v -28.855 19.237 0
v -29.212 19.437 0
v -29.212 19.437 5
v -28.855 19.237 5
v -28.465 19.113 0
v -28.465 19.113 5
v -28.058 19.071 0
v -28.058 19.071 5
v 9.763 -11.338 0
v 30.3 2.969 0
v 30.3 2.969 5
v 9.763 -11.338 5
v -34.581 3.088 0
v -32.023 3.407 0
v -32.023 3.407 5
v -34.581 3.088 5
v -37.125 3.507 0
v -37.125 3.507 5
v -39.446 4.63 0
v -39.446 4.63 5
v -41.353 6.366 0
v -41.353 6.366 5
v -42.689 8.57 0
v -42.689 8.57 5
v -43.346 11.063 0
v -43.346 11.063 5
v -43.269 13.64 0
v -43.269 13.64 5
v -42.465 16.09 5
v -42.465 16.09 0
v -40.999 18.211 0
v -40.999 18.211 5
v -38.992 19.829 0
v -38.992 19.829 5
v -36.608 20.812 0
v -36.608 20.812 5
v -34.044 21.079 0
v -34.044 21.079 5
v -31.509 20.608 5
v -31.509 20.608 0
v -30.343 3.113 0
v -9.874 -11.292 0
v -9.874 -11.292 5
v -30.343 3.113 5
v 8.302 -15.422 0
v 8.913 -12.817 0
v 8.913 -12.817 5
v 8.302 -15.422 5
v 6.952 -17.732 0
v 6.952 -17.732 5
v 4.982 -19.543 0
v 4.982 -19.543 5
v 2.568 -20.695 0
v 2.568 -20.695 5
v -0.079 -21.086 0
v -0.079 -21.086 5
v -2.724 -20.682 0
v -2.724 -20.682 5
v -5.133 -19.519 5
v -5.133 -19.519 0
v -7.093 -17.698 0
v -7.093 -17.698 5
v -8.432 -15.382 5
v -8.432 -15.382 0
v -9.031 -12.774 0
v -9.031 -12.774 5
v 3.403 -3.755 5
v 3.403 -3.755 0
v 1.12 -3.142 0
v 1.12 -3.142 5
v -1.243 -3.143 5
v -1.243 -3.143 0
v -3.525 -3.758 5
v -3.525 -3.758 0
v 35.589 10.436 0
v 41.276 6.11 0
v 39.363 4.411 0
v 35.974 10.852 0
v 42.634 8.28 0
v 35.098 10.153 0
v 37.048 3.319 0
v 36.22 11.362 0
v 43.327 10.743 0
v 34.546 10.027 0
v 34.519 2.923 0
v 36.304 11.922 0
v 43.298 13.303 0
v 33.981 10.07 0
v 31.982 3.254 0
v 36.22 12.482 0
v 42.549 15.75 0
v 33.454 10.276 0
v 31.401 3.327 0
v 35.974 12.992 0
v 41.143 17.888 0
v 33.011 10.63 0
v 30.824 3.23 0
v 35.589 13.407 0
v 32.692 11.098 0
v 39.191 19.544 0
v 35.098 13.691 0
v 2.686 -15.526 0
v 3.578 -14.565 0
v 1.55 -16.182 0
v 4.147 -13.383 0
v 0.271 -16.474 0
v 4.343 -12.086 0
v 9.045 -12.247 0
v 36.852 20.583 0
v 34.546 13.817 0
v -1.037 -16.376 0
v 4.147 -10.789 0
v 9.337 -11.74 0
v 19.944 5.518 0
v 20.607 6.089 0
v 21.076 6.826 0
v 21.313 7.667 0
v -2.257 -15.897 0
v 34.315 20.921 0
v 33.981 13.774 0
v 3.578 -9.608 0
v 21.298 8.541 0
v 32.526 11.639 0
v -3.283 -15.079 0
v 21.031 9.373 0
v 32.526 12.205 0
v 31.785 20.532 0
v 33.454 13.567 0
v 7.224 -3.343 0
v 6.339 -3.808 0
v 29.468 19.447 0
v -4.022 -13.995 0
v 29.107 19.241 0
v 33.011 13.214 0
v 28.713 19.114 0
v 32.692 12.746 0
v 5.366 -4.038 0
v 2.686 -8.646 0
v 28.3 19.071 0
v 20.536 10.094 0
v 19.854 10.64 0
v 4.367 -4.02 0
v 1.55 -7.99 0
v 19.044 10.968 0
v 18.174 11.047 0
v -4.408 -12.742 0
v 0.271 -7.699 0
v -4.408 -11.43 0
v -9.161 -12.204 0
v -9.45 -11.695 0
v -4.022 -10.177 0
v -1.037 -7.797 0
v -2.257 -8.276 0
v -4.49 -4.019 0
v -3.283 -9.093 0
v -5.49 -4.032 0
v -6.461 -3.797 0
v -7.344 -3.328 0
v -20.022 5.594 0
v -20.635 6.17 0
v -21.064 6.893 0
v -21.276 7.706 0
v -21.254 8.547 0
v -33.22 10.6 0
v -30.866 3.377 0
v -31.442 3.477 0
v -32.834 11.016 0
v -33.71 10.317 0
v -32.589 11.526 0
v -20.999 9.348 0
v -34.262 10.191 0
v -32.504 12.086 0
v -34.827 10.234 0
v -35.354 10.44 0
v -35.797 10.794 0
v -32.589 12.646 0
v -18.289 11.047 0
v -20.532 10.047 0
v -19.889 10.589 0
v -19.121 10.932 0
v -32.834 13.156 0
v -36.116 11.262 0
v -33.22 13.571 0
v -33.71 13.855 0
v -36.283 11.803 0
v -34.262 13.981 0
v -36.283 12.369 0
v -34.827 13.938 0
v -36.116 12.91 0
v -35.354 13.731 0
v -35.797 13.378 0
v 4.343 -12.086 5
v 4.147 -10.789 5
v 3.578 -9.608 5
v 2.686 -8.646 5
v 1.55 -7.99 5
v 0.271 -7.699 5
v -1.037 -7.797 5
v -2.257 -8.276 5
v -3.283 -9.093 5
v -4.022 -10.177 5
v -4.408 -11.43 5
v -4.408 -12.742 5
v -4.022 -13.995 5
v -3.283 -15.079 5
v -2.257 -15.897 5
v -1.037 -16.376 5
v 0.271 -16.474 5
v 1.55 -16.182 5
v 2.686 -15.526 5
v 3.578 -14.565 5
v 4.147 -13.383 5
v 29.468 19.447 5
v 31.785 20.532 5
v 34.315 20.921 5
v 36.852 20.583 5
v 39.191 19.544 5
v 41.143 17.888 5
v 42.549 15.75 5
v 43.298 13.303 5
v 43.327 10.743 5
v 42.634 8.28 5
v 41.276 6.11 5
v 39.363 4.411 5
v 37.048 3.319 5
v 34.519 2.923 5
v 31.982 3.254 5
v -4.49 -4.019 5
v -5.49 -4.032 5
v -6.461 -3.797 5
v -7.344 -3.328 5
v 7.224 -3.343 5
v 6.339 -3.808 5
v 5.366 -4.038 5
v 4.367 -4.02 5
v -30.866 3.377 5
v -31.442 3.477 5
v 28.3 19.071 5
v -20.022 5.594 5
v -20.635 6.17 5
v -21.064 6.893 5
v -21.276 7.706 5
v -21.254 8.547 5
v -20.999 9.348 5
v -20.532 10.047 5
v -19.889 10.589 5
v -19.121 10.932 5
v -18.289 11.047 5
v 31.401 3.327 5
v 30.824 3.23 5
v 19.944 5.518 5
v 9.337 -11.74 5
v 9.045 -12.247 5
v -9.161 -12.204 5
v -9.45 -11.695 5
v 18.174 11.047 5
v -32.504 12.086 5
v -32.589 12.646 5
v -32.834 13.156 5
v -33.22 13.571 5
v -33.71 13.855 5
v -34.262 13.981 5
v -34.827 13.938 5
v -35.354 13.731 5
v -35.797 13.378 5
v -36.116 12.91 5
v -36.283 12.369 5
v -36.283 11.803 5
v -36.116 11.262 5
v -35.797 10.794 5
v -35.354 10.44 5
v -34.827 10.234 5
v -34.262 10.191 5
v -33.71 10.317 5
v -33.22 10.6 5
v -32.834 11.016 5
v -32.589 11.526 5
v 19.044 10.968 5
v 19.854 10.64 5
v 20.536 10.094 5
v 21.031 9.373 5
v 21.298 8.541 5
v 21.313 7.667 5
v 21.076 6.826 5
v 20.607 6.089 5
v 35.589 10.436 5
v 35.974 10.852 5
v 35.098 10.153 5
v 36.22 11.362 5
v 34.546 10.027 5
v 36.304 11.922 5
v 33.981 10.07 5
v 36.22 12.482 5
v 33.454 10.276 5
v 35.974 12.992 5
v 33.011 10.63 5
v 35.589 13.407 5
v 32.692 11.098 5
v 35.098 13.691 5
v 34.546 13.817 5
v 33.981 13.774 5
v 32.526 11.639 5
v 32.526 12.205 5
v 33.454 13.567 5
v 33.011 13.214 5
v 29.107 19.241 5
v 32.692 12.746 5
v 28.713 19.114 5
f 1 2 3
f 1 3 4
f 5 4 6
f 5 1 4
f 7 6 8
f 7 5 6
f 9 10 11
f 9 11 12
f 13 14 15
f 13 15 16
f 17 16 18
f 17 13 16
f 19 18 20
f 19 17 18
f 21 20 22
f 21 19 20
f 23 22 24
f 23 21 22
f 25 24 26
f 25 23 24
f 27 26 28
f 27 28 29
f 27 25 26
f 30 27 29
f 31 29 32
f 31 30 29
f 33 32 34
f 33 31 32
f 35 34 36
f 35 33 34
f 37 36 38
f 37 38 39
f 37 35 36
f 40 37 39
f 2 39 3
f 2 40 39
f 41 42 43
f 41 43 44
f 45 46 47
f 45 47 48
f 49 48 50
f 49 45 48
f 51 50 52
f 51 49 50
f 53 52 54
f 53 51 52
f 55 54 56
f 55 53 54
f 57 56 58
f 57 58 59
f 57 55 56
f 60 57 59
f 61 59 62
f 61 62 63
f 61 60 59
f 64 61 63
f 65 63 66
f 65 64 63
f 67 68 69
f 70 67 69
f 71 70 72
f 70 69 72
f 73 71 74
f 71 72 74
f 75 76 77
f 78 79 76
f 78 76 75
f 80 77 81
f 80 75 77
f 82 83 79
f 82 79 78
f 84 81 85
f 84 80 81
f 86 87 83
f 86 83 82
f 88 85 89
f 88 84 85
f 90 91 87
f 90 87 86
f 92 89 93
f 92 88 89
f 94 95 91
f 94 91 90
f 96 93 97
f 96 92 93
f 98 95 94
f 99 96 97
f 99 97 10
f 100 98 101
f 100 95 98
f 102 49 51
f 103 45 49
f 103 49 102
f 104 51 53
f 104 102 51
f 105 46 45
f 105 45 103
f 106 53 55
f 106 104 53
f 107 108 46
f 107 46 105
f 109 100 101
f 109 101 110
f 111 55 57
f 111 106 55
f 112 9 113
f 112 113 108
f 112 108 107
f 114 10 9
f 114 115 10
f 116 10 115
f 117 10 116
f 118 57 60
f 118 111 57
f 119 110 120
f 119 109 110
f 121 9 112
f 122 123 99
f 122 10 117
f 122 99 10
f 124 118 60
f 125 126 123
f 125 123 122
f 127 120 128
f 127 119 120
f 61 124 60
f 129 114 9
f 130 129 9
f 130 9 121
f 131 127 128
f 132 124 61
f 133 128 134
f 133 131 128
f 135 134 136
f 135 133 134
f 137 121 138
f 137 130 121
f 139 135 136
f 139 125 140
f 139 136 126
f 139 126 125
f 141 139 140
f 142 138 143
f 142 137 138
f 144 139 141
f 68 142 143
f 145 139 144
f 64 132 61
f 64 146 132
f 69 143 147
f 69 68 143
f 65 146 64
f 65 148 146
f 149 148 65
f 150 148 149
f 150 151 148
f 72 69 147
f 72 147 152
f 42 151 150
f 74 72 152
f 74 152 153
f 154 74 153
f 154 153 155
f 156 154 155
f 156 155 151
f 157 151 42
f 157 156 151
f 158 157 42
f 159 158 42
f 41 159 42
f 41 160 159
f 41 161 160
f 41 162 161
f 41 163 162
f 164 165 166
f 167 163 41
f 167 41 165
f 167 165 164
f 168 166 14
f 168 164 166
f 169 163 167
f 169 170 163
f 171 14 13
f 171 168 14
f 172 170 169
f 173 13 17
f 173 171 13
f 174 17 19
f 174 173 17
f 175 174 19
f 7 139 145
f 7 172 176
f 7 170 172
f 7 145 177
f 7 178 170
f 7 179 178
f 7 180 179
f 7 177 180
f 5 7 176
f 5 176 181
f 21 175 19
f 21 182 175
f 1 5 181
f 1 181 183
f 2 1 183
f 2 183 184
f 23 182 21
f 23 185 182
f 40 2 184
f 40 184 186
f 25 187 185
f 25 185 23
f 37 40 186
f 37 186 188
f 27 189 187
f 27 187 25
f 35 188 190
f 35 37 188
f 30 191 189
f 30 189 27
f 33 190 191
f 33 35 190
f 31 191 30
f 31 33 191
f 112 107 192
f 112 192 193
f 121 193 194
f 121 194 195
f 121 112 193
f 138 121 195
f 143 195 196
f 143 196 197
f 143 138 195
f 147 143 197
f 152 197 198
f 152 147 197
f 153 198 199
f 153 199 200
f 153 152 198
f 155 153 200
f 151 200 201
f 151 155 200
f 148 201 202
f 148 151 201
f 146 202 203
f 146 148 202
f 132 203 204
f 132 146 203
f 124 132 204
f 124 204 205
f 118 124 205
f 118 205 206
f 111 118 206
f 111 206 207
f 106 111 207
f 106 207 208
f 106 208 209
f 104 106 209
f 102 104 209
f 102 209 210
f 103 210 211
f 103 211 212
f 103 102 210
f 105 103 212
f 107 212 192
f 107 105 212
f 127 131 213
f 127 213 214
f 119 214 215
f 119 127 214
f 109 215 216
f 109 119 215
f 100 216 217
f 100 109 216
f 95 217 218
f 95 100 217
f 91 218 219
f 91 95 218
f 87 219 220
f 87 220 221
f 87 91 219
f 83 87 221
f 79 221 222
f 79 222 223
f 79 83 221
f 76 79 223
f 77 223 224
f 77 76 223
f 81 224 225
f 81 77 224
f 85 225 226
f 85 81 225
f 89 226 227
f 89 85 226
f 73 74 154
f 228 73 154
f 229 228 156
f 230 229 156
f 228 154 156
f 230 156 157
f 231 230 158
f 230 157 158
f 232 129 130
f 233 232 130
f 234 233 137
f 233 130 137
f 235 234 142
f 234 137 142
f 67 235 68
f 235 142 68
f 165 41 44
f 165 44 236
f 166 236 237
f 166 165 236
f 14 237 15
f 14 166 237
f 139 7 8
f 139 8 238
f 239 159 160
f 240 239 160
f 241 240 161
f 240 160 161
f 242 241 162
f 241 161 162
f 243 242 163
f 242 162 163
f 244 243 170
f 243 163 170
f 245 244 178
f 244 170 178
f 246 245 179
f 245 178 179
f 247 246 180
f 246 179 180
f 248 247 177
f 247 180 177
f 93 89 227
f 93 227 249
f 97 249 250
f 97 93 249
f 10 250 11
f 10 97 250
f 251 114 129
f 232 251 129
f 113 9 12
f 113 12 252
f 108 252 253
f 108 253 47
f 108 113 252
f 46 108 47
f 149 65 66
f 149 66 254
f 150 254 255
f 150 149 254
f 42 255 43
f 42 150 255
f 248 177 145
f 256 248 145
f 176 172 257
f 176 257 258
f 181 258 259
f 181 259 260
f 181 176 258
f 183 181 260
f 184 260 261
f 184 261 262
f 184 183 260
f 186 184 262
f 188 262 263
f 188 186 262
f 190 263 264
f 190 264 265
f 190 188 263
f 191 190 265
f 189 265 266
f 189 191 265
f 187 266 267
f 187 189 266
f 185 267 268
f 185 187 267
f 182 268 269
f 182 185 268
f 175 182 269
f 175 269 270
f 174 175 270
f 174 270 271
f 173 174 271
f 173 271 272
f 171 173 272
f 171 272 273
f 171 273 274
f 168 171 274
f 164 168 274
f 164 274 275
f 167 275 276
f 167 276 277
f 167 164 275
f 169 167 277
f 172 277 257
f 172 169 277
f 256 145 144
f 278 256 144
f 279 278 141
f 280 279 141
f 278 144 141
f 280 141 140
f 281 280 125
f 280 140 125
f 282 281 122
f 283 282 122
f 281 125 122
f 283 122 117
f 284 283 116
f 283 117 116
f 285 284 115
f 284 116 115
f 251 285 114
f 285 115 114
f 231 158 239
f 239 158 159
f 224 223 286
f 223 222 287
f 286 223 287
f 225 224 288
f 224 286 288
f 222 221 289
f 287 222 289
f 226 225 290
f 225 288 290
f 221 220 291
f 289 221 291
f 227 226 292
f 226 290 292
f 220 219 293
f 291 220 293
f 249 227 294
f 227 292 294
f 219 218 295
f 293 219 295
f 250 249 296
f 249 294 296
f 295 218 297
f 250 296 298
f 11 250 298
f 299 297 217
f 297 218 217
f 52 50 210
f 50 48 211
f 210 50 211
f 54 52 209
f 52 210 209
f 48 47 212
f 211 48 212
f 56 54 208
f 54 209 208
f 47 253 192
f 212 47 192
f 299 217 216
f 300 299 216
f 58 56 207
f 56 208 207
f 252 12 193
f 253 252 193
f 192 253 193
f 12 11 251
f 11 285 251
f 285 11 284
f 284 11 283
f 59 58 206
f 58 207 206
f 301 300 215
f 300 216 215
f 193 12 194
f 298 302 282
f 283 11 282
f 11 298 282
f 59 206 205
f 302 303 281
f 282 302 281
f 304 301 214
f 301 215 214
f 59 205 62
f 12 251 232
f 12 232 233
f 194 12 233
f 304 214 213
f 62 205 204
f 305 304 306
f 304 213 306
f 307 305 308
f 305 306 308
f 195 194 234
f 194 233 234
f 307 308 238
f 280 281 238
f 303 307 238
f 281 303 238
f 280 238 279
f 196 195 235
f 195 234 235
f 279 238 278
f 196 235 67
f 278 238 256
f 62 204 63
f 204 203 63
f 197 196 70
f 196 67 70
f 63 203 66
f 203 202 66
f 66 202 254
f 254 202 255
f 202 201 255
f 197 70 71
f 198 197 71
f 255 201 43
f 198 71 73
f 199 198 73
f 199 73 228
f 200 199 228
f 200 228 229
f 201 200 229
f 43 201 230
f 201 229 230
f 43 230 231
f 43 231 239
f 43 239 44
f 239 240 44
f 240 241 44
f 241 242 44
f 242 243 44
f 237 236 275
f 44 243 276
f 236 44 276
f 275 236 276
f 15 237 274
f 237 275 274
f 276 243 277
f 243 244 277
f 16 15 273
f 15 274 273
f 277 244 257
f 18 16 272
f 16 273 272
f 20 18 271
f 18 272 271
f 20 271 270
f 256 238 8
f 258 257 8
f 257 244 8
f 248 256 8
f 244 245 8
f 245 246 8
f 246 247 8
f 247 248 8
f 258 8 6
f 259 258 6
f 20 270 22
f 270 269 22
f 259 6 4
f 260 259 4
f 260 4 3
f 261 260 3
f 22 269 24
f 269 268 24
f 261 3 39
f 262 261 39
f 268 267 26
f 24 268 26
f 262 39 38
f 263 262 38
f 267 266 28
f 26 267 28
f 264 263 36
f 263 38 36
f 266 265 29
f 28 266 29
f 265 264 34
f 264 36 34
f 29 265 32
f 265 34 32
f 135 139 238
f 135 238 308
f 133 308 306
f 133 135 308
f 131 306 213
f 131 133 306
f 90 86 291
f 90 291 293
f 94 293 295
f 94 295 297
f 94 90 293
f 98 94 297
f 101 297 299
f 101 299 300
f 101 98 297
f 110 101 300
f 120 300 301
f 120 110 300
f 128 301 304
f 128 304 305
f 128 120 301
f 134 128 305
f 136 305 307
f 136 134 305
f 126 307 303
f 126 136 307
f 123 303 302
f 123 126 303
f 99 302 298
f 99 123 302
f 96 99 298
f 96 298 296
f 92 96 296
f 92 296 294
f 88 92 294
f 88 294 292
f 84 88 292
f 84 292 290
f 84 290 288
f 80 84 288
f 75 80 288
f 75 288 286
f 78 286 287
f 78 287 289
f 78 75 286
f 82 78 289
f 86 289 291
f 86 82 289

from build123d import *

# Parameters (mm, degrees)
ESQUISSE1_R        = 1.9
ESQUISSE1_R_2      = 4.4
BOSS_EXTRU_1_DEPTH = 5


with BuildPart() as part:
    # Esquisse1 → Boss.-Extru.1 (new body)
    with BuildSketch(Plane.XY):
        with BuildLine():
            Line((30.300082727, 2.968924298), (9.763004104, -11.338457247))
            ThreePointArc((9.763004104, -11.338457247), (9.172405802, -11.982601165), (8.912853429, -12.817083223))
            ThreePointArc((8.912853429, -12.817083223), (-0.078877501, -21.086221809), (-9.031083885, -12.77430994))
            ThreePointArc((-9.031083885, -12.77430994), (-9.286654991, -11.938599972), (-9.874175684, -11.291647751))
            Line((-9.874175684, -11.291647751), (-30.342811787, 3.113479848))
            ThreePointArc((-30.342811787, 3.113479848), (-31.150105491, 3.448150462), (-32.023034153, 3.406640278))
            ThreePointArc((-32.023034153, 3.406640278), (-43.269038369, 13.640318644), (-29.212114116, 19.437185406))
            ThreePointArc((-29.212114116, 19.437185406), (-28.66359268, 19.164598239), (-28.058297671, 19.070803357))
            Line((-28.058297671, 19.070803357), (28.299854, 19.070803357))
            ThreePointArc((28.299854, 19.070803357), (28.91331959, 19.167212023), (29.467641782, 19.447143388))
            ThreePointArc((29.467641782, 19.447143388), (43.297743059, 13.302630265), (31.981683615, 3.25407109))
            ThreePointArc((31.981683615, 3.25407109), (31.108962768, 3.29974241), (30.300082727, 2.968924298))
        make_face()
        with Locations((-34.404288116, 12.085904623)):
            Circle(ESQUISSE1_R, mode=Mode.SUBTRACT)
        with Locations((34.404288116, 11.921884391)):
            Circle(ESQUISSE1_R, mode=Mode.SUBTRACT)
        with Locations((-0.057424101, -12.086247379)):
            Circle(ESQUISSE1_R_2, mode=Mode.SUBTRACT)
        with BuildLine():
            Line((-18.288536611, 11.047420606), (18.173688409, 11.047420606))
            ThreePointArc((18.173688409, 11.047420606), (21.194925395, 8.966949346), (19.94448595, 5.518379385))
            Line((19.94448595, 5.518379385), (7.224114855, -3.343407178))
            ThreePointArc((7.224114855, -3.343407178), (5.36635505, -4.038296984), (3.403177648, -3.755316724))
            ThreePointArc((3.403177648, -3.755316724), (-0.06139684, -3.06515242), (-3.525362111, -3.758367937))
            ThreePointArc((-3.525362111, -3.758367937), (-5.489866285, -4.031985712), (-7.344292156, -3.328247102))
            Line((-7.344292156, -3.328247102), (-20.022270936, 5.59408196))
            ThreePointArc((-20.022270936, 5.59408196), (-21.154680468, 8.956364593), (-18.288536611, 11.047420606))
        make_face(mode=Mode.SUBTRACT)
    extrude(amount=BOSS_EXTRU_1_DEPTH)


solid = part.part
